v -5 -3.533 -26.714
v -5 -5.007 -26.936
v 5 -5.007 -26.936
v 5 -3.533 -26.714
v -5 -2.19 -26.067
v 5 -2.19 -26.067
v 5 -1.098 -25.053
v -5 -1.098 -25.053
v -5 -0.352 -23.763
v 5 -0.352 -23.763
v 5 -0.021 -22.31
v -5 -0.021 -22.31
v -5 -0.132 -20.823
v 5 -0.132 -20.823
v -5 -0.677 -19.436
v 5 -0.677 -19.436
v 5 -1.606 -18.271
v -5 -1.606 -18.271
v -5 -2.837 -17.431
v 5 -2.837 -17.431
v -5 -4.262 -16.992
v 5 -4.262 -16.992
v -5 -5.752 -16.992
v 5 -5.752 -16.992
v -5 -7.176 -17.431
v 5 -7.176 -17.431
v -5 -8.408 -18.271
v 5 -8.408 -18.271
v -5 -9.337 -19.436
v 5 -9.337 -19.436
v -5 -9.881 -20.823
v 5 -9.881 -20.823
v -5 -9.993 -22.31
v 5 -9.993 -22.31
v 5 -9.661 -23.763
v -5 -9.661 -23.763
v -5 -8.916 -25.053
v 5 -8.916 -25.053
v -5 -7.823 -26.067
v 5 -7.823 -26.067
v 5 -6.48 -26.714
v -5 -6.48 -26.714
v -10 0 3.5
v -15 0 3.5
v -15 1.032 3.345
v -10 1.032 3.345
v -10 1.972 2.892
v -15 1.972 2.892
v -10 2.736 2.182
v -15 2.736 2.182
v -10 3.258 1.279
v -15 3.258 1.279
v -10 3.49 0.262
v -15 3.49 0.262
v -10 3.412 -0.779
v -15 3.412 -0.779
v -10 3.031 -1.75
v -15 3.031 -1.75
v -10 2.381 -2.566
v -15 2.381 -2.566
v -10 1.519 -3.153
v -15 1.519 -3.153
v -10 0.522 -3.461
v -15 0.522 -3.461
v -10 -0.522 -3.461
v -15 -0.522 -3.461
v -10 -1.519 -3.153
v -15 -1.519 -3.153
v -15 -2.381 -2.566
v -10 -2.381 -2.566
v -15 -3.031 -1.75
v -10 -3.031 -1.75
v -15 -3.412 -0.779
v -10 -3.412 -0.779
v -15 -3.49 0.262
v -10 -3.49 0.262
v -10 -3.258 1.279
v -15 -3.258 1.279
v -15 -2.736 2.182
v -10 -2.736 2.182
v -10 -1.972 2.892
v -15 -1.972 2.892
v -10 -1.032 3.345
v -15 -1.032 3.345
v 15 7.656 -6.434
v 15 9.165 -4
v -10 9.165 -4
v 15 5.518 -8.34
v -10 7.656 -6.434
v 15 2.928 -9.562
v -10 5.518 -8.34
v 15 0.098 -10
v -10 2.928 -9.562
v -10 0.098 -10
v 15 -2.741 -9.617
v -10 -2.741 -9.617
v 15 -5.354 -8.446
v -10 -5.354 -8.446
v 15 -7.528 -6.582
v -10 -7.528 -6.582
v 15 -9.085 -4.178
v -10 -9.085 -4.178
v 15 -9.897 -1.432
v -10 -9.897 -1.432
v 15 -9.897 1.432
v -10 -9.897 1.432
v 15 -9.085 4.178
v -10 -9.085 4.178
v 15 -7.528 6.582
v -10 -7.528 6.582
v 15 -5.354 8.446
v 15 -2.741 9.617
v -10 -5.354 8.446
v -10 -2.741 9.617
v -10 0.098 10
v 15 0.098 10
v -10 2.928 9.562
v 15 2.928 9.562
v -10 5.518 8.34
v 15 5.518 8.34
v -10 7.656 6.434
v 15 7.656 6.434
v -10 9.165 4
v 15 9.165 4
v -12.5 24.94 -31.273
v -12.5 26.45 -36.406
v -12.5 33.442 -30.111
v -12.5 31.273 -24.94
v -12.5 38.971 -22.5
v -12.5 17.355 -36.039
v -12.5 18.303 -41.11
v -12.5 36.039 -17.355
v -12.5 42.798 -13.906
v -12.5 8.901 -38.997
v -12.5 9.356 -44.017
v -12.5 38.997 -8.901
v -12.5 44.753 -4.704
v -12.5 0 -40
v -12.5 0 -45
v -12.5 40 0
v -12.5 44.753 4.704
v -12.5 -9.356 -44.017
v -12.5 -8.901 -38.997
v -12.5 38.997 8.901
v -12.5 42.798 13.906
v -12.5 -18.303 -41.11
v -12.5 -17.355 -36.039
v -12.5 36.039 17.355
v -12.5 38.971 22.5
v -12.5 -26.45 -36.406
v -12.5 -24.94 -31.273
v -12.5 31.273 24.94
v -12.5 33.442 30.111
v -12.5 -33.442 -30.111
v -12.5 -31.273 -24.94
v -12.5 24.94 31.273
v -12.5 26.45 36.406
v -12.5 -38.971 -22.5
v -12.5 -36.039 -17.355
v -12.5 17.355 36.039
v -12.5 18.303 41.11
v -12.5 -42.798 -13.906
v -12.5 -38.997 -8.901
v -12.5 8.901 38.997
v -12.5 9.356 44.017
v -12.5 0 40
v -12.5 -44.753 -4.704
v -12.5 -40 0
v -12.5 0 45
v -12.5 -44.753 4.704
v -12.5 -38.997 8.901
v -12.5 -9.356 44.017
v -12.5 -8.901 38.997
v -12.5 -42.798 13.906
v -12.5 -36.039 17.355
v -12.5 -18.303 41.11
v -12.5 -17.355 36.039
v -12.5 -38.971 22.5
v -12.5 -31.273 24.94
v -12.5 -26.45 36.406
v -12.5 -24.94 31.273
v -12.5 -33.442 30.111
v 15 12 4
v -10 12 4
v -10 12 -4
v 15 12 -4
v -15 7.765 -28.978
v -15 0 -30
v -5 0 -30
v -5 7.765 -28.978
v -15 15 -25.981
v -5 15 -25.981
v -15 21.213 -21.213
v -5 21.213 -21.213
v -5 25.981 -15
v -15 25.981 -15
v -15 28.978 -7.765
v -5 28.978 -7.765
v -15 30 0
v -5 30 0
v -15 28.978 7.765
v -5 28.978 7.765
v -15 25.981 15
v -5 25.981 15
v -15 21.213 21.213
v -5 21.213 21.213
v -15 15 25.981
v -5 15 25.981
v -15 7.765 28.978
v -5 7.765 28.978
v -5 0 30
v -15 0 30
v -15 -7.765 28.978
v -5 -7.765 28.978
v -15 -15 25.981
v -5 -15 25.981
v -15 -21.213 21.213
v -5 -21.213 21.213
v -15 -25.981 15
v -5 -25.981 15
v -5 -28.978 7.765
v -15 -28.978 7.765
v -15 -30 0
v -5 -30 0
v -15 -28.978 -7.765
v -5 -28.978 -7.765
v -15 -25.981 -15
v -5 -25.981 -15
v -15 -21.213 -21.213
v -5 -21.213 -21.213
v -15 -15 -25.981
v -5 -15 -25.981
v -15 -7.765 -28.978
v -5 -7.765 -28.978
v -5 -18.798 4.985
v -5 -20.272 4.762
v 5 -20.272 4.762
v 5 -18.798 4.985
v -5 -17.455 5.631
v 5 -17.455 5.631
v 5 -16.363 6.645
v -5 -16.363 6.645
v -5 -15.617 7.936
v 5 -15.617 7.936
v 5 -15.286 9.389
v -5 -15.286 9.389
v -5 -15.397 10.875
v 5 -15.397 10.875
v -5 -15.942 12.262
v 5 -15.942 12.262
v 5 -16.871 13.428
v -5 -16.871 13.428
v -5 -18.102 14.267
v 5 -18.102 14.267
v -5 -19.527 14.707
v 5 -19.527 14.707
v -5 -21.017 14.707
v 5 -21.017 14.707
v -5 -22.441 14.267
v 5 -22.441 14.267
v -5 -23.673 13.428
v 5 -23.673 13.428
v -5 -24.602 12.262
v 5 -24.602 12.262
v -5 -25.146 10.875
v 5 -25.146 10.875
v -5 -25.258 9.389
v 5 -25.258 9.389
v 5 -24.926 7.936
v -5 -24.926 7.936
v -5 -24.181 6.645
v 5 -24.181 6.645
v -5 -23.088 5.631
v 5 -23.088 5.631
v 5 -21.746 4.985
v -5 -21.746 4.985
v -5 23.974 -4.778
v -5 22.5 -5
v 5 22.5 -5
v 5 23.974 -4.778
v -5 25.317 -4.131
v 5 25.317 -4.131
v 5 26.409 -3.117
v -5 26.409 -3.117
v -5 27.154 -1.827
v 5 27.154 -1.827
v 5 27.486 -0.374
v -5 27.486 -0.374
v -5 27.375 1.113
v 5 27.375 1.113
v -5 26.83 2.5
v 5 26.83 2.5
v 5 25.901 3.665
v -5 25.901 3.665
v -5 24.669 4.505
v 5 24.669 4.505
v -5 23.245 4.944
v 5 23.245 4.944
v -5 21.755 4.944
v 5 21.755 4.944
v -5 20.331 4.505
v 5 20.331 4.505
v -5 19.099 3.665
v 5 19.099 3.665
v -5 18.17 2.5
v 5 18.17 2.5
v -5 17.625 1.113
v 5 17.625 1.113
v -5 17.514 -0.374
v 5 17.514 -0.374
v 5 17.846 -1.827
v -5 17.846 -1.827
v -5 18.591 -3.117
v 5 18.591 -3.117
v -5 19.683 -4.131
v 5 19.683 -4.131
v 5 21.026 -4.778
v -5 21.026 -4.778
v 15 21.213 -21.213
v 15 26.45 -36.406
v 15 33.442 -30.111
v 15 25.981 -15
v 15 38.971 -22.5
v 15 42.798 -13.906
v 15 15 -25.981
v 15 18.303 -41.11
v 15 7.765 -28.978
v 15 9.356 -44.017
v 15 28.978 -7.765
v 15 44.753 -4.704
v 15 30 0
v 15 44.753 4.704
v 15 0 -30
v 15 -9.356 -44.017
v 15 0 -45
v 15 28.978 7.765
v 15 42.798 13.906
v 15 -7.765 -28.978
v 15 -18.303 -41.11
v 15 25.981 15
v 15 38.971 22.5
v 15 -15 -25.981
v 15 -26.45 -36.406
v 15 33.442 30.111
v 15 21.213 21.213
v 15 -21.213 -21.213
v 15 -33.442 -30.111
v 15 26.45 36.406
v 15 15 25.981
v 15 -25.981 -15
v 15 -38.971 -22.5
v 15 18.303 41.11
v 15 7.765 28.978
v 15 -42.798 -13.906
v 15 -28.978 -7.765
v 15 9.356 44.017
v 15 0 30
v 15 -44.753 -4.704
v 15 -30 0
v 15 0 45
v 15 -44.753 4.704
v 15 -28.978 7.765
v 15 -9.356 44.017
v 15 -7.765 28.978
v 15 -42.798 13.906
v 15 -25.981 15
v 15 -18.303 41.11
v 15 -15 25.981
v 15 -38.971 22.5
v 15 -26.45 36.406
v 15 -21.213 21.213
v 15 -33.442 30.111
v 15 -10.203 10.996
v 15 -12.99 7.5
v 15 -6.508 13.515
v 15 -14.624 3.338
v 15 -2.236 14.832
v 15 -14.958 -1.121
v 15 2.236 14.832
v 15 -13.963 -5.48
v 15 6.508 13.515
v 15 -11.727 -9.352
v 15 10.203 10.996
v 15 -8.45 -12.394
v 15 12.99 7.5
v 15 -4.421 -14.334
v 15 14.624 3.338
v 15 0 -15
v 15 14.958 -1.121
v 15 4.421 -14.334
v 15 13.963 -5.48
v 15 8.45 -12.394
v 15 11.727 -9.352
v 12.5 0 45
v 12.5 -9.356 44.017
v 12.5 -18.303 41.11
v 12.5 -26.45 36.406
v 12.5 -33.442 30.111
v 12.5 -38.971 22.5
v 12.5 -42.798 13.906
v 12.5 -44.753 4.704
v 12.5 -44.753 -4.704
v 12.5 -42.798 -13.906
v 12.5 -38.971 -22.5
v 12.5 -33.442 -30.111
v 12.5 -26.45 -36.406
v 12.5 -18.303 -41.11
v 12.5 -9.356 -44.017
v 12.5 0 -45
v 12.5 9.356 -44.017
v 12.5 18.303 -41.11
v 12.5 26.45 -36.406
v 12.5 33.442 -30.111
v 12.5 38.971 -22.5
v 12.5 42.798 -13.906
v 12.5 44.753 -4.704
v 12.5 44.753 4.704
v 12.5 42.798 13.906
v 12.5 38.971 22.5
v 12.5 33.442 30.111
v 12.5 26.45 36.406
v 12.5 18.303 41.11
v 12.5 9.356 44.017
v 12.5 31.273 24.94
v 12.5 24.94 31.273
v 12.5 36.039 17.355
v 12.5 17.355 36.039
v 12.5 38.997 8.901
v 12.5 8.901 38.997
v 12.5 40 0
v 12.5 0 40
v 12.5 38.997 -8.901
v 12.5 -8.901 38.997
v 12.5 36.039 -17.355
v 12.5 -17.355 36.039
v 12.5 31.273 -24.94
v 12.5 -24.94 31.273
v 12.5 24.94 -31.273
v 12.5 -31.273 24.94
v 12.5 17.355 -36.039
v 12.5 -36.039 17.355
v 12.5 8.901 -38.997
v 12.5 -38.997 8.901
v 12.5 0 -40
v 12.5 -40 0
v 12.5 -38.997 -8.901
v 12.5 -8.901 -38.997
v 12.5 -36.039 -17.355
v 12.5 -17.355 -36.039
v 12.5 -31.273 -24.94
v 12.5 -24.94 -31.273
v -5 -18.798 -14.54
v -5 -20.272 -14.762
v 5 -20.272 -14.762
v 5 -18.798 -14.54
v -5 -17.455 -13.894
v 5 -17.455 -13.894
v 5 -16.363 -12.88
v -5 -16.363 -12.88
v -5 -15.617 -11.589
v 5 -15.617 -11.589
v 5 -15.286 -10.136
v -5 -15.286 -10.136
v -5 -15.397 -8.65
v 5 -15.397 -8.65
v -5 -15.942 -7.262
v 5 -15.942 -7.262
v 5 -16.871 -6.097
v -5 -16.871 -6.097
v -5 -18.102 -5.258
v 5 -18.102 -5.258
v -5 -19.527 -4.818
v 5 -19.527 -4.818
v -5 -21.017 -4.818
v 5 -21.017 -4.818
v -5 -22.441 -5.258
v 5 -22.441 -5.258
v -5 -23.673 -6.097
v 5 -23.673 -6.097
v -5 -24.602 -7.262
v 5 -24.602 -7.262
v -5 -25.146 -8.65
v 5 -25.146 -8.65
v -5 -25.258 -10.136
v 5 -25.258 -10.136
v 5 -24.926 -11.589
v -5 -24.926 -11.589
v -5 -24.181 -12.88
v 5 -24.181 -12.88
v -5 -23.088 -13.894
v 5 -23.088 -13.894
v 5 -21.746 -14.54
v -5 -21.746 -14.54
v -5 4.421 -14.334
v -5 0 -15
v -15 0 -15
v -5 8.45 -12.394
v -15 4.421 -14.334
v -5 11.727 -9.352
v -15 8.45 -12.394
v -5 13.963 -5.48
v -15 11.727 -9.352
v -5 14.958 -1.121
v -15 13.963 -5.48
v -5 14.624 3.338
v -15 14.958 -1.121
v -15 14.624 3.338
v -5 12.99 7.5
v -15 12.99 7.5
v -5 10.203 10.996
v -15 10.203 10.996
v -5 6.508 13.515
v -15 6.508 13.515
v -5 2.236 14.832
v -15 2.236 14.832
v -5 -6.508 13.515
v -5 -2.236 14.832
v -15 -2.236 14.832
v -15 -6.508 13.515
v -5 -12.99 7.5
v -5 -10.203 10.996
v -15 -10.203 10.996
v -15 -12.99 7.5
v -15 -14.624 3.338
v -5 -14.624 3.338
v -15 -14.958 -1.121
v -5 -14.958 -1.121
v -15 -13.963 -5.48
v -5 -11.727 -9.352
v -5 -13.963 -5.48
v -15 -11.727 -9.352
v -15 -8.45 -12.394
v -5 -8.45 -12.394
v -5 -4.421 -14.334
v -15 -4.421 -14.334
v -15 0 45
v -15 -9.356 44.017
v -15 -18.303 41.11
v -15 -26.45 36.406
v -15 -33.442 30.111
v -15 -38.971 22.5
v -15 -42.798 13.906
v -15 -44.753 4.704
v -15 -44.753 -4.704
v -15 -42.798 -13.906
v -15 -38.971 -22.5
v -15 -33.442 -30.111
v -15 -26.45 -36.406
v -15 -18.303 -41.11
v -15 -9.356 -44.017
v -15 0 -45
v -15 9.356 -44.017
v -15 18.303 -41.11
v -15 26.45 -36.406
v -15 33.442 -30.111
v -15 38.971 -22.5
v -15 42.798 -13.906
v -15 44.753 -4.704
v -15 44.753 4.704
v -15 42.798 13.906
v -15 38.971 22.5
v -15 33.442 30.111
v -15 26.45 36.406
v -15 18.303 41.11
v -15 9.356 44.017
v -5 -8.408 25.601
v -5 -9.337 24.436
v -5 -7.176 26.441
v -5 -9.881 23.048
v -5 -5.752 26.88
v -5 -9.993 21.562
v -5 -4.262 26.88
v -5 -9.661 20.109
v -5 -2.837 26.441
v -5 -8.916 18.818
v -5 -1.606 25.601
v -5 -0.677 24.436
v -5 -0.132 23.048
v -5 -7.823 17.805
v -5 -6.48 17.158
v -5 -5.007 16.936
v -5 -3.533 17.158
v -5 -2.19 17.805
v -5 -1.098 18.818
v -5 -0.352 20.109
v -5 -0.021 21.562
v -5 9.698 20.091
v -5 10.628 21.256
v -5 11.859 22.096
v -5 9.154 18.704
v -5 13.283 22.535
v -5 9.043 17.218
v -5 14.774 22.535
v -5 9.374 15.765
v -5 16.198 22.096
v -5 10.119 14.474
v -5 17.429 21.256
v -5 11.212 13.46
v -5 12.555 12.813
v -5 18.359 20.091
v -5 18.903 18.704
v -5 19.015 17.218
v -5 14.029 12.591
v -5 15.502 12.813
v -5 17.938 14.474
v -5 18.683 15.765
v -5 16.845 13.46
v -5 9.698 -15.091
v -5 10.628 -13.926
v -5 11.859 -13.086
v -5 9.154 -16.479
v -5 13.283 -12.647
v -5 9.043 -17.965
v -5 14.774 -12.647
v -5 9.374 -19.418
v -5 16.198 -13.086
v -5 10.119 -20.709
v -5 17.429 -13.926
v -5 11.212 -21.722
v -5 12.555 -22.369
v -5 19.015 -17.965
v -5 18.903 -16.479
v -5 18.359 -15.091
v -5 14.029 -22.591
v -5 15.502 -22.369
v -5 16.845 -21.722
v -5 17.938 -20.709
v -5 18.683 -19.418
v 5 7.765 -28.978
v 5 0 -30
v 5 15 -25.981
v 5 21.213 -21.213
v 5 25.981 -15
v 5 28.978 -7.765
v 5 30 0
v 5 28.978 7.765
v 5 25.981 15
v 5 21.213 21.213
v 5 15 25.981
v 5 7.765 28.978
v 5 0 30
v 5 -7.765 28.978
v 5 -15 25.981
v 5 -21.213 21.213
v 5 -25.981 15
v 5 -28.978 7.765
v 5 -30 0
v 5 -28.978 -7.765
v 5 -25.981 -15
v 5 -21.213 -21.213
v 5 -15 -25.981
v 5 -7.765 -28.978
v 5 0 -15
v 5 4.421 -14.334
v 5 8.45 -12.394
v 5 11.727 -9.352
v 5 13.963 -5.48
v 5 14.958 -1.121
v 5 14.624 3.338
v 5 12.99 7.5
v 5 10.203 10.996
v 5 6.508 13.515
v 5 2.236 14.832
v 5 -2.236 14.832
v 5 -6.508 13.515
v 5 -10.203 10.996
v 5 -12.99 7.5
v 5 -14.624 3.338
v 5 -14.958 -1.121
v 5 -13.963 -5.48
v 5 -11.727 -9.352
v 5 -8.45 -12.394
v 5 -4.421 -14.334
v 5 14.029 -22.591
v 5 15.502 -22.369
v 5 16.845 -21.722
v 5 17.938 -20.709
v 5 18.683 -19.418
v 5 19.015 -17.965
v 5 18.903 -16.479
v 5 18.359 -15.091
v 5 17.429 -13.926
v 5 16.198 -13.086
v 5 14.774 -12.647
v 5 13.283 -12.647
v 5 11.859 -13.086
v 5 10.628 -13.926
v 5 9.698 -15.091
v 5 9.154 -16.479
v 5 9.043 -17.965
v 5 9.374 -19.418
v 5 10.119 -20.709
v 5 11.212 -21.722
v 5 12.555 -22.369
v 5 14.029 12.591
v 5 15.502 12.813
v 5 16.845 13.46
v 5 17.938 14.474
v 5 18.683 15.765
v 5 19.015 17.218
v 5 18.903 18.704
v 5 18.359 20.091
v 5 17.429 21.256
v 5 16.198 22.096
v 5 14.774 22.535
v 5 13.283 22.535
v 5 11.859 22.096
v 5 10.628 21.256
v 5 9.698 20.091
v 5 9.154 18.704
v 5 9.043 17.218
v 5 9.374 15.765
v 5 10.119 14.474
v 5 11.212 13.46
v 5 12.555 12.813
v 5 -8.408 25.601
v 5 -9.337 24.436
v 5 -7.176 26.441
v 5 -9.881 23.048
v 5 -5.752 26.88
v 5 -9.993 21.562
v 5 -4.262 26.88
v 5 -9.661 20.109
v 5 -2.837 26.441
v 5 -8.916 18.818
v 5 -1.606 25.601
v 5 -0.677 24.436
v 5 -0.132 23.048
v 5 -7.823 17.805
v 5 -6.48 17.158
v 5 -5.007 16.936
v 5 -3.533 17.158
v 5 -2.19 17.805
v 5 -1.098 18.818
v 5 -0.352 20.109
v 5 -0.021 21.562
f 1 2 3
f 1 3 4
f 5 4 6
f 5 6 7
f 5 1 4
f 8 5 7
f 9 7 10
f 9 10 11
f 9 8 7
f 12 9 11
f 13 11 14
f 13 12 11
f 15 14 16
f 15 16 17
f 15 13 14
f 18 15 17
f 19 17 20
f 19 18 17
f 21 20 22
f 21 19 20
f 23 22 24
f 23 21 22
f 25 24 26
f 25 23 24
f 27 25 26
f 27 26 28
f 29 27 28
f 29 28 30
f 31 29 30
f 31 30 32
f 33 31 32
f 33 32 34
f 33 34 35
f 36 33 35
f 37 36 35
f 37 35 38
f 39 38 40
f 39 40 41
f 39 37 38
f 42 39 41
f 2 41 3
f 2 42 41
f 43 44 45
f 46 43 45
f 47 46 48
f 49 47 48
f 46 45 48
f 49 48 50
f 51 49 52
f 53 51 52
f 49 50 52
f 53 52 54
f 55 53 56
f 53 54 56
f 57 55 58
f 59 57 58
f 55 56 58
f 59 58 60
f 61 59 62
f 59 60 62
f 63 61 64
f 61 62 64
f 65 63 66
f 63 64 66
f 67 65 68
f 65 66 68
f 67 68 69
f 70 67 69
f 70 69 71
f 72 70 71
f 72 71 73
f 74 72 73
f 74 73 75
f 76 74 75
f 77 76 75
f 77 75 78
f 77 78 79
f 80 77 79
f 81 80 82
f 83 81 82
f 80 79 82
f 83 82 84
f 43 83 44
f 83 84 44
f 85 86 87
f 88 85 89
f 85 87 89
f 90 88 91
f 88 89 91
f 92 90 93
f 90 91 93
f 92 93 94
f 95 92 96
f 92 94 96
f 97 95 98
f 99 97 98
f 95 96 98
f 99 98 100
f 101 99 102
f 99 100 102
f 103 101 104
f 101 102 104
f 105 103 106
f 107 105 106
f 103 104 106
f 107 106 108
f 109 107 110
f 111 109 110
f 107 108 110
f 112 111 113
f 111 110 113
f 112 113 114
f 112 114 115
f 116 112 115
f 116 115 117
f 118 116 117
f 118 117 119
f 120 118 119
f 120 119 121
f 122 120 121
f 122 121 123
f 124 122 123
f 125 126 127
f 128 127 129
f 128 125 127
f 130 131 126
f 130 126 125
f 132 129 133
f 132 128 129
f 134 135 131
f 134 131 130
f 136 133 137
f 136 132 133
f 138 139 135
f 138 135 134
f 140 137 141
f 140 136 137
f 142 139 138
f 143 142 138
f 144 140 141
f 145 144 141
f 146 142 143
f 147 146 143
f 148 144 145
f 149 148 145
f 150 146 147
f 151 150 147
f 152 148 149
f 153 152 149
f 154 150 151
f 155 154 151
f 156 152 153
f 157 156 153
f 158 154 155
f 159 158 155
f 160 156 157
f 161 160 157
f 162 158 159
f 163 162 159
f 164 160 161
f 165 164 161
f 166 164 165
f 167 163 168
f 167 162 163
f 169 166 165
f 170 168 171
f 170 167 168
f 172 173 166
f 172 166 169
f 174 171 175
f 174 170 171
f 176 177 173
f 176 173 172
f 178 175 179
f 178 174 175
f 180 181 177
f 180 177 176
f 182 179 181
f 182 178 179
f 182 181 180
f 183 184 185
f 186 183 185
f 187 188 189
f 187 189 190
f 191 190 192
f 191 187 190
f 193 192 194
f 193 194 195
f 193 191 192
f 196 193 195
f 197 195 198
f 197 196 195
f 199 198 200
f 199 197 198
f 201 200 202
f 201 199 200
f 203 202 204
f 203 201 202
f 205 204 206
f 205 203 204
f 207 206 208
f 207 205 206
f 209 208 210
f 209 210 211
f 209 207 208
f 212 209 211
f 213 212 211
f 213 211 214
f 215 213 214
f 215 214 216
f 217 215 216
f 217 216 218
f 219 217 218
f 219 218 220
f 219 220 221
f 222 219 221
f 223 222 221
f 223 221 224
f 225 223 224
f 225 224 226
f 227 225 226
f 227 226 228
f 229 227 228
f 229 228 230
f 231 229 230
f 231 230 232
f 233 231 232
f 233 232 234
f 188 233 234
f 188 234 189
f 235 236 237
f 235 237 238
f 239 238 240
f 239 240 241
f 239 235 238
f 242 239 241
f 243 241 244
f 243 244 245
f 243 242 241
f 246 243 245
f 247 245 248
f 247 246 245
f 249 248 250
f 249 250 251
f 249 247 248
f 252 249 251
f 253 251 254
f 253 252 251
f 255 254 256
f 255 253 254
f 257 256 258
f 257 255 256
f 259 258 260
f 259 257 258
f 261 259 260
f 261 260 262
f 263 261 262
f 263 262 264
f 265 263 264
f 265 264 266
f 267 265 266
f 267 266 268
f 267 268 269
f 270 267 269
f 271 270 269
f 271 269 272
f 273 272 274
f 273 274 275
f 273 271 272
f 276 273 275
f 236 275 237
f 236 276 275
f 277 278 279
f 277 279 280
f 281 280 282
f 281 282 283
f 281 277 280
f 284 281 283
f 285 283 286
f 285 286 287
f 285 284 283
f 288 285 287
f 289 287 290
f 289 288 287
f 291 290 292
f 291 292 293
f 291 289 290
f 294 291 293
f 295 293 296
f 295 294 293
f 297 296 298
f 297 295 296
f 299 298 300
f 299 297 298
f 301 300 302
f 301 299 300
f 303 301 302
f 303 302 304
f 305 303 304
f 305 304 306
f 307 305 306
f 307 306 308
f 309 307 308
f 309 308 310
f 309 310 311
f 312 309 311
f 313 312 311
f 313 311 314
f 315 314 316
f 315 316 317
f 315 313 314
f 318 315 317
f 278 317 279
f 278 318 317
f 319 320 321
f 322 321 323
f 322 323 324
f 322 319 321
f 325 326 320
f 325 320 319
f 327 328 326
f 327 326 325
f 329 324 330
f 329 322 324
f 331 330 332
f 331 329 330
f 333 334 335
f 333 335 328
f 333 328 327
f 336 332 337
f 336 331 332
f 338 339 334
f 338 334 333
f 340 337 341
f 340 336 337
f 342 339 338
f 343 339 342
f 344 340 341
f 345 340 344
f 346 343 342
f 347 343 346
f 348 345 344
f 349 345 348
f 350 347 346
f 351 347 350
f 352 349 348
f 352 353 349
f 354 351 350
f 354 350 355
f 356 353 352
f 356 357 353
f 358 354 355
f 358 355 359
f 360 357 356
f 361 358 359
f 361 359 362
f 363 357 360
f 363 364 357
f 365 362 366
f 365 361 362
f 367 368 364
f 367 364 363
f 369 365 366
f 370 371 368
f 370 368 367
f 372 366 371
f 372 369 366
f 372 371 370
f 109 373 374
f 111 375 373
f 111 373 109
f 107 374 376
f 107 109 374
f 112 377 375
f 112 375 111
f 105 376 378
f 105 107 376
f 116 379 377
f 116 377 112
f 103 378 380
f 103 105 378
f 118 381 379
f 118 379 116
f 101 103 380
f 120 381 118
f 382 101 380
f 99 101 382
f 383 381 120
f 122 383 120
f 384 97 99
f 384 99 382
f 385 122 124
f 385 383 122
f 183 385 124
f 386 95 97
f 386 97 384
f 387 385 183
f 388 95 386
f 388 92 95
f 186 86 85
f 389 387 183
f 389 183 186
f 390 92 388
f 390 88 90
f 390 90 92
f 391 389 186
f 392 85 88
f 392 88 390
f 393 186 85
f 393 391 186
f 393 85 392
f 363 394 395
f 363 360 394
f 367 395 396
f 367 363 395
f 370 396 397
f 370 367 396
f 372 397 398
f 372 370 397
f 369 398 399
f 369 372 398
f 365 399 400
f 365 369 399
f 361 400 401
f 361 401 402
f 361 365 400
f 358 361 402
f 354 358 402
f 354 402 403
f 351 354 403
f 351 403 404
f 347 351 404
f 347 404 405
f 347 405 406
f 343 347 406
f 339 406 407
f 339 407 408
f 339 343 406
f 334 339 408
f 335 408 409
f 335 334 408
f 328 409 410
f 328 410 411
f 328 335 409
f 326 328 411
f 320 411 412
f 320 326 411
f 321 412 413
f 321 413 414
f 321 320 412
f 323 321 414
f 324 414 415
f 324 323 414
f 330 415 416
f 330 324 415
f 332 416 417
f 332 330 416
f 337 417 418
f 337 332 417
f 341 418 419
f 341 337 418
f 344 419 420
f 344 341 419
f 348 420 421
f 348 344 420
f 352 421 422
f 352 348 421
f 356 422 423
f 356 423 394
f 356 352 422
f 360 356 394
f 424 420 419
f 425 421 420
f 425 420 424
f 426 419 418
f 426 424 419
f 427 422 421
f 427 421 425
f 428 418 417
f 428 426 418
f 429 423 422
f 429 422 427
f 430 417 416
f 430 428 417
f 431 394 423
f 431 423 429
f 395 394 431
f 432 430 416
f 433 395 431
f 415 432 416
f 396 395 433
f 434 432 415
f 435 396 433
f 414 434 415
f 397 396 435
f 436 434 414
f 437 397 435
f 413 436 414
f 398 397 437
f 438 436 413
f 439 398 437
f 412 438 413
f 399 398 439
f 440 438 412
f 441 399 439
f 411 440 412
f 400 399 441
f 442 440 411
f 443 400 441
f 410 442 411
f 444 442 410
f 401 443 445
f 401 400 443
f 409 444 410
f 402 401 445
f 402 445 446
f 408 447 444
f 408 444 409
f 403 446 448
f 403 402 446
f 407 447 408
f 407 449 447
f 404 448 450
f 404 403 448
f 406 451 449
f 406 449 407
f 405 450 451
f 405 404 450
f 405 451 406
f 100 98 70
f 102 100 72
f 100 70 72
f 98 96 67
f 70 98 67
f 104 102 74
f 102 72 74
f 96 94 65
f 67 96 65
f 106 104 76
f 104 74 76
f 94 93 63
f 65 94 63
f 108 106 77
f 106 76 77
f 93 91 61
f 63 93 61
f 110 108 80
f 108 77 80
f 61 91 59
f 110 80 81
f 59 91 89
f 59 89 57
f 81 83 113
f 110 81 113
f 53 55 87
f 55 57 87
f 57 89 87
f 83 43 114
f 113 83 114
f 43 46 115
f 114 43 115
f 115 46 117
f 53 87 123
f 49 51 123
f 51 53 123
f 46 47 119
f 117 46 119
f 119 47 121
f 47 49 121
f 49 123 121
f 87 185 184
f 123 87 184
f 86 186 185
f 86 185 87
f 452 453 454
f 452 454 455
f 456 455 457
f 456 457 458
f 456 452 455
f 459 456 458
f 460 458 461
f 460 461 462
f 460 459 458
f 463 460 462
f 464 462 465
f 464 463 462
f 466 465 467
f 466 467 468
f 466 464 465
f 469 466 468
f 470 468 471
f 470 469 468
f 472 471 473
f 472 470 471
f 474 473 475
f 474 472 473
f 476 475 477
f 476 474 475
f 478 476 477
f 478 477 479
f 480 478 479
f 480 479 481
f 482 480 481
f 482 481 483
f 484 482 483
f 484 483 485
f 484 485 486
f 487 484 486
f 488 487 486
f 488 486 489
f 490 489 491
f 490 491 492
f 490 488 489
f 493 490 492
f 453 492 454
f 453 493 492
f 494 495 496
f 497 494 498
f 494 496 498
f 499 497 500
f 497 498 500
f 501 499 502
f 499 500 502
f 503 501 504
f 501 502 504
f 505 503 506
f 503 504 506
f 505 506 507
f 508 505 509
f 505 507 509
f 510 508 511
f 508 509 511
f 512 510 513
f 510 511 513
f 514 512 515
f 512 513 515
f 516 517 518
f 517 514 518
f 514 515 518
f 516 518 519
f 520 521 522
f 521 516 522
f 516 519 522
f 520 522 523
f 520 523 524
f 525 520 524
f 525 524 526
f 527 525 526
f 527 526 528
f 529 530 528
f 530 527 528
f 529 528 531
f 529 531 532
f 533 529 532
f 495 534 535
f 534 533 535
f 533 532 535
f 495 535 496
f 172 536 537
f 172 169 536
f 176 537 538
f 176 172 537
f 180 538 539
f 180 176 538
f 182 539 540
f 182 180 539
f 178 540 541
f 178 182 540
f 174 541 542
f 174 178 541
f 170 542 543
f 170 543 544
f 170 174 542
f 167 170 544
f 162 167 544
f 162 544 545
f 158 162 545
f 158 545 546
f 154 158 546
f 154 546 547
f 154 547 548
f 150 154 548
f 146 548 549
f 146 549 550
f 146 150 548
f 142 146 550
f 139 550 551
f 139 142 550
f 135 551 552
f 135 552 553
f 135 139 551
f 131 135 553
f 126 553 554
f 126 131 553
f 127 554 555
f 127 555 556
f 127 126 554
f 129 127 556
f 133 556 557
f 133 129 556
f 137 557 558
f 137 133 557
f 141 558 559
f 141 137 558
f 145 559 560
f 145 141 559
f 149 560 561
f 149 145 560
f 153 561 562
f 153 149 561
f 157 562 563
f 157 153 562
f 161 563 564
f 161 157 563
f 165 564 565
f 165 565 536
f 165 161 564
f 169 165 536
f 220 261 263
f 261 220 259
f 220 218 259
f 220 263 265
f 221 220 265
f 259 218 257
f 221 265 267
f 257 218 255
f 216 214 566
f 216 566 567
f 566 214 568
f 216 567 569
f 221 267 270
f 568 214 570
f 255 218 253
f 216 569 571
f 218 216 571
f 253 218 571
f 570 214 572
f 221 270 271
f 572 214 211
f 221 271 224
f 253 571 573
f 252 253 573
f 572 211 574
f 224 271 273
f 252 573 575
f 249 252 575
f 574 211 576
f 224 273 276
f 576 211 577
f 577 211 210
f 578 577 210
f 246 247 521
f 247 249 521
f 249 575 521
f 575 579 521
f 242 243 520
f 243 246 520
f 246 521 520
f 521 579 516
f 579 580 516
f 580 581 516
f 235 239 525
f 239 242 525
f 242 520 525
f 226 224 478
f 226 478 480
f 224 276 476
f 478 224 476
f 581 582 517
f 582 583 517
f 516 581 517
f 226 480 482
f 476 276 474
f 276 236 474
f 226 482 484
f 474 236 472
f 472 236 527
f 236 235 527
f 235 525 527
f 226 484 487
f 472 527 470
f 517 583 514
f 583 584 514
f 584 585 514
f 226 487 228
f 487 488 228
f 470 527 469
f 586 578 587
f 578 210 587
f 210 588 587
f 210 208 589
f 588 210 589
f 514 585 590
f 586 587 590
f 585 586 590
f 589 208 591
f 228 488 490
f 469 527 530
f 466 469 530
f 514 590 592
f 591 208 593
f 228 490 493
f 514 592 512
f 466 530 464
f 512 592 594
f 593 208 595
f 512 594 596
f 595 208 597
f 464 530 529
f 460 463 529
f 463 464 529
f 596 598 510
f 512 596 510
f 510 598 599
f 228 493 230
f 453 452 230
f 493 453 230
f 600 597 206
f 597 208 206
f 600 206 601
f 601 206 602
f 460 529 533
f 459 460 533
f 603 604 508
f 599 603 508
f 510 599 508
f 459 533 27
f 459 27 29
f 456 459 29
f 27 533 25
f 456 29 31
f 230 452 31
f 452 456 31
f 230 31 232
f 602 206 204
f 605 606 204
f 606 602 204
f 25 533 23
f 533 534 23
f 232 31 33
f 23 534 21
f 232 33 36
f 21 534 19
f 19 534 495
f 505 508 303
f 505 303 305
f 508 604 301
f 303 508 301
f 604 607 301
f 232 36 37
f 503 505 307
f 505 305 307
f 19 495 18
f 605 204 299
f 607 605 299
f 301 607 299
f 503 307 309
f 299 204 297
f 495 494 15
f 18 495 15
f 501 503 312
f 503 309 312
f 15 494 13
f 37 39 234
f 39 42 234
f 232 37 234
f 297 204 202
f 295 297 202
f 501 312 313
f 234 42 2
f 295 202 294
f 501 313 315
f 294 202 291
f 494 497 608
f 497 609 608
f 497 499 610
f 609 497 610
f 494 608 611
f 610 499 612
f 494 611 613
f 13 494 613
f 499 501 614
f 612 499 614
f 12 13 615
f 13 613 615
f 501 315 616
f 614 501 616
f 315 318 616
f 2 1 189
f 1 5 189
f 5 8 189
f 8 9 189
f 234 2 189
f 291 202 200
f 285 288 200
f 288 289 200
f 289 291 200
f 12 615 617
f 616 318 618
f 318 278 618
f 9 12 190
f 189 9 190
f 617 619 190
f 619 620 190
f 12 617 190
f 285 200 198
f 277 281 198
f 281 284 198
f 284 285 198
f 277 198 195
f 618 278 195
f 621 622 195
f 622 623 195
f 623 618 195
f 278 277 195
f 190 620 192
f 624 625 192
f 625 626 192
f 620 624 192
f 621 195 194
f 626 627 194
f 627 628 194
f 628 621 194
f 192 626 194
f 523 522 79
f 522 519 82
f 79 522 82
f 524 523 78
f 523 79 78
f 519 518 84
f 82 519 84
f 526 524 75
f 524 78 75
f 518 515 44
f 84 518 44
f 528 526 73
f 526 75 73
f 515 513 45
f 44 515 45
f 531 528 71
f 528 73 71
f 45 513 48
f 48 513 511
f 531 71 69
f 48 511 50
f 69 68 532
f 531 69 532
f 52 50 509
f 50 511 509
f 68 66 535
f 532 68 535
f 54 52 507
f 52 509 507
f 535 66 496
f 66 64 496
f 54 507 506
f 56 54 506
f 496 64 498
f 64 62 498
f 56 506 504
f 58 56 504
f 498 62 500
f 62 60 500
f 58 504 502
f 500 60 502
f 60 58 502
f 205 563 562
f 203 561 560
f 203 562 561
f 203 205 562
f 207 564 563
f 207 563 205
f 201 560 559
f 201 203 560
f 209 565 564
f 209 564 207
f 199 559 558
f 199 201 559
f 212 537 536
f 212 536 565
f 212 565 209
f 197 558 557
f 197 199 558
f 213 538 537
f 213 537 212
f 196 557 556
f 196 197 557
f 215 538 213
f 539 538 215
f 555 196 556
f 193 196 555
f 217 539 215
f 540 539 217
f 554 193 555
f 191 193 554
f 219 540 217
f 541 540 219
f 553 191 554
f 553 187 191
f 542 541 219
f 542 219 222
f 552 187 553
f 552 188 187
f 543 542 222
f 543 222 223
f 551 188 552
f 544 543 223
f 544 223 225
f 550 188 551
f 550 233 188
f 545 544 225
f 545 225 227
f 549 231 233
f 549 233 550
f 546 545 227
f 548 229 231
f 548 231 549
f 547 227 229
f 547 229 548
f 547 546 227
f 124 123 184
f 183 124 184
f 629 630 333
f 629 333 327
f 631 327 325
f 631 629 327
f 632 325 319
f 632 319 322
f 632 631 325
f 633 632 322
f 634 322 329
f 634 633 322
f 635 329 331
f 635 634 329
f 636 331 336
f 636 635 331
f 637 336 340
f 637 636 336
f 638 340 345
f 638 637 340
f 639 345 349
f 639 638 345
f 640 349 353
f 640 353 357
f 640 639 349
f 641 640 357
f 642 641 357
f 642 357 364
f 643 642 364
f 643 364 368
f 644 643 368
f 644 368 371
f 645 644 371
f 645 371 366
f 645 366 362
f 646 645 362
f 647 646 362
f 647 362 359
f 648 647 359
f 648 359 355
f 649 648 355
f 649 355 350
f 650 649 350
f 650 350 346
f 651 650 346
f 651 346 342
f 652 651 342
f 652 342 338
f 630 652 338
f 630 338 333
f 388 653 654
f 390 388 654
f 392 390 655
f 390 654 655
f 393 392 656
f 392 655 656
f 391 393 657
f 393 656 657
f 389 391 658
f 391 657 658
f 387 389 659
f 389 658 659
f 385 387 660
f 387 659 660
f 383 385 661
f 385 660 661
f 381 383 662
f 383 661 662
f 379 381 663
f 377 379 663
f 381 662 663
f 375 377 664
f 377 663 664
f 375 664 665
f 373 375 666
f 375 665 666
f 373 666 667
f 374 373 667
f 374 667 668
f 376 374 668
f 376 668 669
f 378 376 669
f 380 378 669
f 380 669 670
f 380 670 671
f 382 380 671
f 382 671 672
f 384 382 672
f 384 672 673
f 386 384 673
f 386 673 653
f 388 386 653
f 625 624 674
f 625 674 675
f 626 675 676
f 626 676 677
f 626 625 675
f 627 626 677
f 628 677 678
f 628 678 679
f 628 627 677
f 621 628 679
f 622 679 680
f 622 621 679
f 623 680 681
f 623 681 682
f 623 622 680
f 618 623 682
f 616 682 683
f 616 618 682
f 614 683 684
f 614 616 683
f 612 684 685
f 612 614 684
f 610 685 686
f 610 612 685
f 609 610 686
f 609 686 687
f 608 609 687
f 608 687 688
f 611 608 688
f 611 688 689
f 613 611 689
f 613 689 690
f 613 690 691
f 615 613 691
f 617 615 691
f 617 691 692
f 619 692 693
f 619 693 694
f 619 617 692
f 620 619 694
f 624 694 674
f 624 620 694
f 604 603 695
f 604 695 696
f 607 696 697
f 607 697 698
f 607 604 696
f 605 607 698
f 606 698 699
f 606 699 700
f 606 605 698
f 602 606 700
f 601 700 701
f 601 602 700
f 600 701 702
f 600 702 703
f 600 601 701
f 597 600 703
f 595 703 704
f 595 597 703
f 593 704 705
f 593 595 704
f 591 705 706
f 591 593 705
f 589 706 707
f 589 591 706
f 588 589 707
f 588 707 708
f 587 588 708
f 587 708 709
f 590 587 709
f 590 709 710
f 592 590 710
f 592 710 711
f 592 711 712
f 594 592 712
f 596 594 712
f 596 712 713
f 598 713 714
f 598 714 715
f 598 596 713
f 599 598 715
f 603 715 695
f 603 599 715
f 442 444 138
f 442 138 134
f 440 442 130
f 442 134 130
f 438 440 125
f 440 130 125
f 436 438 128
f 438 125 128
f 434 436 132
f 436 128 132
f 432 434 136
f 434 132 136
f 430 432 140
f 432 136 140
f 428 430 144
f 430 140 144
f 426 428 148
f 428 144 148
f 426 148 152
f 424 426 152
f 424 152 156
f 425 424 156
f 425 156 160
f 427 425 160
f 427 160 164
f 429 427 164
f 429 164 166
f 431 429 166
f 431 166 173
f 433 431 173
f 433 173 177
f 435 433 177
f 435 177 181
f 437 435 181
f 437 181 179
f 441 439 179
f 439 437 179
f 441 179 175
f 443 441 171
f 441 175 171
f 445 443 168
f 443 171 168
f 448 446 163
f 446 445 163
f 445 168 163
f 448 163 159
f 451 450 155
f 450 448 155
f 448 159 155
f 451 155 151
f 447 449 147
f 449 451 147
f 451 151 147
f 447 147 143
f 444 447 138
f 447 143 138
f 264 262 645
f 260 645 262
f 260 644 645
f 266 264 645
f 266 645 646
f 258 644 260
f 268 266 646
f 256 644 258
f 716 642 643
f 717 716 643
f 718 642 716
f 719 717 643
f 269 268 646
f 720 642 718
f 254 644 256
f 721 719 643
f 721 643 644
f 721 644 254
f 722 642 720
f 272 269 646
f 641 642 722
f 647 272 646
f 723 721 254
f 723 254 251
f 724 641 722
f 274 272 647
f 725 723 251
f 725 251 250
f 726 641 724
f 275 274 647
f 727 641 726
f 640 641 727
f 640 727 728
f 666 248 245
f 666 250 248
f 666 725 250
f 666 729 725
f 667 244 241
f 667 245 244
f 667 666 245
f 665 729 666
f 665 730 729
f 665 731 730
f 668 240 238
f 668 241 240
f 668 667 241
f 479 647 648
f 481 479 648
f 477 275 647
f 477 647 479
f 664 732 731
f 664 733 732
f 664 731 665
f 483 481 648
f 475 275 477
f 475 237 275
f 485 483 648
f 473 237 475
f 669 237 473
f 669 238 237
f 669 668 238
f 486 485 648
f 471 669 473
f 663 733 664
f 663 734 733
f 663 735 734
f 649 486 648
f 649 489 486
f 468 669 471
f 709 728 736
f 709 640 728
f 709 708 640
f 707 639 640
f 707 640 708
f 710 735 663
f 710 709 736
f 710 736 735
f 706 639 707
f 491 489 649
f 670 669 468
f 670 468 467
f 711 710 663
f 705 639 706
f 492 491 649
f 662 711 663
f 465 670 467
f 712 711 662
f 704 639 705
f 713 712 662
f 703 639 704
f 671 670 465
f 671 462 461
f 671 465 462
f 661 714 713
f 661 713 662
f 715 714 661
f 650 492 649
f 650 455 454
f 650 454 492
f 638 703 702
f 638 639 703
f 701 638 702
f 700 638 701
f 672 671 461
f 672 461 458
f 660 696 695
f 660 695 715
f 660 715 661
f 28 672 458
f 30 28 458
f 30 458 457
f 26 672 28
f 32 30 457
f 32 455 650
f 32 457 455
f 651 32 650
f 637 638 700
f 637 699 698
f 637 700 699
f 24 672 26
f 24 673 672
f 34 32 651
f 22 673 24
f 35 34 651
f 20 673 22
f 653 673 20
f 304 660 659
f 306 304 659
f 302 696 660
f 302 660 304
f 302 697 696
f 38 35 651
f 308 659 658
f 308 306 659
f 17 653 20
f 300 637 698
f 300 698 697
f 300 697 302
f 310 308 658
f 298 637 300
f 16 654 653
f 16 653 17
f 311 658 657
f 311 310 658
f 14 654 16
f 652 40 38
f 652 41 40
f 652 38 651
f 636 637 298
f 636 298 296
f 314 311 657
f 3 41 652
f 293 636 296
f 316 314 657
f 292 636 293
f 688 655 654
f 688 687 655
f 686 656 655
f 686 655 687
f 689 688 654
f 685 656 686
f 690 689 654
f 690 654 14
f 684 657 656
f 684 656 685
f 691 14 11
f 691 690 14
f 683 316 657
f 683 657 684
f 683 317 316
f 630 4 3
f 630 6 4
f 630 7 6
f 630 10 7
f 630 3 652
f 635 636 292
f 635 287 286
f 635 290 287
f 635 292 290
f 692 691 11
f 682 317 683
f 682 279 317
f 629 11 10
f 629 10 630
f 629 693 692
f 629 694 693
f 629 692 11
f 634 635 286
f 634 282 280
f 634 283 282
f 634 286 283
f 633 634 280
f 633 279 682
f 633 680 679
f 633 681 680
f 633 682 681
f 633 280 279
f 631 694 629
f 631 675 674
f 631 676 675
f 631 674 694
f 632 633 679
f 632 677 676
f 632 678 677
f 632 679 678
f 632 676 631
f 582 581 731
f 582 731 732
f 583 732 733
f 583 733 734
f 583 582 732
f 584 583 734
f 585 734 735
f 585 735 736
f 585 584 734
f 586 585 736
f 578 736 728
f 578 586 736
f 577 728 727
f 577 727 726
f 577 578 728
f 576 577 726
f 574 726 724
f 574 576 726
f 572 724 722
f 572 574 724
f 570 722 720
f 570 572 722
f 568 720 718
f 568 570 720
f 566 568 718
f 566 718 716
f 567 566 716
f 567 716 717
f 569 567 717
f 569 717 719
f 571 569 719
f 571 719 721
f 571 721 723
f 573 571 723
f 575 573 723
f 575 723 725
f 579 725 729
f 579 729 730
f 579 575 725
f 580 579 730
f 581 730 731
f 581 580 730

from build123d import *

# Parameters (mm, degrees)
BOSS_EXTRUDE1_DEPTH      = 15
BOSS_EXTRUDE1_DEPTH_BACK = 15
SKETCH1_R                = 15
SKETCH2_R                = 13
SKETCH2_R_2              = 3.5
BOSS_EXTRUDE2_DEPTH      = 5
BOSS_EXTRUDE3_DEPTH      = 5
BOSS_EXTRUDE3_DEPTH_BACK = 5
SKETCH3_R                = 30
SKETCH3_R_2              = 5
SKETCH3_R_3              = 13.5
BOSS_EXTRUDE4_DEPTH      = 15
BOSS_EXTRUDE4_DEPTH_BACK = 15
SKETCH4_R                = 40
SKETCH4_R_2              = 30


with BuildPart() as part:
    # Sketch1 → Boss-Extrude1 (new, two sides: drawn at the far end of the back side and taken through both)
    with BuildSketch(Plane(origin=(0, 0, 0), x_dir=(0, 0, -1), z_dir=(1, 0, 0)).offset(-BOSS_EXTRUDE1_DEPTH_BACK)):
        Circle(SKETCH1_R)
        with BuildLine():
            Line((-4, 9.16515139), (-4, 12))
            Line((-4, 12), (4, 12))
            Line((4, 12), (4, 9.16515139))
            ThreePointArc((4, 9.16515139), (0, -10), (-4, 9.16515139))
        make_face(mode=Mode.SUBTRACT)
    extrude(amount=BOSS_EXTRUDE1_DEPTH + BOSS_EXTRUDE1_DEPTH_BACK)

    # Sketch2 → Boss-Extrude2 (add)
    with BuildSketch(Plane.ZY.offset(15)):
        Circle(SKETCH2_R)
        Circle(SKETCH2_R_2, mode=Mode.SUBTRACT)
    extrude(amount=-BOSS_EXTRUDE2_DEPTH)

    # Sketch3 → Boss-Extrude3 (add, two sides: drawn at the far end of the back side and taken through both)
    with BuildSketch(Plane(origin=(0, 0, 0), x_dir=(0, 0, -1), z_dir=(1, 0, 0)).offset(-BOSS_EXTRUDE3_DEPTH_BACK)):
        Circle(SKETCH3_R)
        with Locations((0, 22.5)):
            Circle(SKETCH3_R_2, mode=Mode.SUBTRACT)
        with Locations((17.591208356, 14.028520542)):
            Circle(SKETCH3_R_2, mode=Mode.SUBTRACT)
        with Locations((21.935878024, -5.006721014)):
            Circle(SKETCH3_R_2, mode=Mode.SUBTRACT)
        with Locations((9.76238413, -20.271799528)):
            Circle(SKETCH3_R_2, mode=Mode.SUBTRACT)
        with Locations((-9.76238413, -20.271799528)):
            Circle(SKETCH3_R_2, mode=Mode.SUBTRACT)
        with Locations((-21.935878024, -5.006721014)):
            Circle(SKETCH3_R_2, mode=Mode.SUBTRACT)
        with Locations((-17.591208356, 14.028520542)):
            Circle(SKETCH3_R_2, mode=Mode.SUBTRACT)
        Circle(SKETCH3_R_3, mode=Mode.SUBTRACT)
    extrude(amount=BOSS_EXTRUDE3_DEPTH + BOSS_EXTRUDE3_DEPTH_BACK)

    # Sketch4 → Boss-Extrude4 (add, two sides: drawn at the far end of the back side and taken through both)
    with BuildSketch(Plane(origin=(0, 0, 0), x_dir=(0, 0, -1), z_dir=(1, 0, 0)).offset(-BOSS_EXTRUDE4_DEPTH_BACK)):
        Circle(SKETCH4_R)
        Circle(SKETCH4_R_2, mode=Mode.SUBTRACT)
    extrude(amount=BOSS_EXTRUDE4_DEPTH + BOSS_EXTRUDE4_DEPTH_BACK)

    # Sketch5 → Revolve1 (revolve)
    with BuildSketch(Plane.XY):
        Polygon((-15, 36), (-15, 45), (-12.5, 45), (-12.5, 37), (12.5, 37), (12.5, 45), (15, 45), (15, 36), align=None)
    revolve(axis=Axis((0, 0, 0), (1, 0, 0)))


solid = part.part
